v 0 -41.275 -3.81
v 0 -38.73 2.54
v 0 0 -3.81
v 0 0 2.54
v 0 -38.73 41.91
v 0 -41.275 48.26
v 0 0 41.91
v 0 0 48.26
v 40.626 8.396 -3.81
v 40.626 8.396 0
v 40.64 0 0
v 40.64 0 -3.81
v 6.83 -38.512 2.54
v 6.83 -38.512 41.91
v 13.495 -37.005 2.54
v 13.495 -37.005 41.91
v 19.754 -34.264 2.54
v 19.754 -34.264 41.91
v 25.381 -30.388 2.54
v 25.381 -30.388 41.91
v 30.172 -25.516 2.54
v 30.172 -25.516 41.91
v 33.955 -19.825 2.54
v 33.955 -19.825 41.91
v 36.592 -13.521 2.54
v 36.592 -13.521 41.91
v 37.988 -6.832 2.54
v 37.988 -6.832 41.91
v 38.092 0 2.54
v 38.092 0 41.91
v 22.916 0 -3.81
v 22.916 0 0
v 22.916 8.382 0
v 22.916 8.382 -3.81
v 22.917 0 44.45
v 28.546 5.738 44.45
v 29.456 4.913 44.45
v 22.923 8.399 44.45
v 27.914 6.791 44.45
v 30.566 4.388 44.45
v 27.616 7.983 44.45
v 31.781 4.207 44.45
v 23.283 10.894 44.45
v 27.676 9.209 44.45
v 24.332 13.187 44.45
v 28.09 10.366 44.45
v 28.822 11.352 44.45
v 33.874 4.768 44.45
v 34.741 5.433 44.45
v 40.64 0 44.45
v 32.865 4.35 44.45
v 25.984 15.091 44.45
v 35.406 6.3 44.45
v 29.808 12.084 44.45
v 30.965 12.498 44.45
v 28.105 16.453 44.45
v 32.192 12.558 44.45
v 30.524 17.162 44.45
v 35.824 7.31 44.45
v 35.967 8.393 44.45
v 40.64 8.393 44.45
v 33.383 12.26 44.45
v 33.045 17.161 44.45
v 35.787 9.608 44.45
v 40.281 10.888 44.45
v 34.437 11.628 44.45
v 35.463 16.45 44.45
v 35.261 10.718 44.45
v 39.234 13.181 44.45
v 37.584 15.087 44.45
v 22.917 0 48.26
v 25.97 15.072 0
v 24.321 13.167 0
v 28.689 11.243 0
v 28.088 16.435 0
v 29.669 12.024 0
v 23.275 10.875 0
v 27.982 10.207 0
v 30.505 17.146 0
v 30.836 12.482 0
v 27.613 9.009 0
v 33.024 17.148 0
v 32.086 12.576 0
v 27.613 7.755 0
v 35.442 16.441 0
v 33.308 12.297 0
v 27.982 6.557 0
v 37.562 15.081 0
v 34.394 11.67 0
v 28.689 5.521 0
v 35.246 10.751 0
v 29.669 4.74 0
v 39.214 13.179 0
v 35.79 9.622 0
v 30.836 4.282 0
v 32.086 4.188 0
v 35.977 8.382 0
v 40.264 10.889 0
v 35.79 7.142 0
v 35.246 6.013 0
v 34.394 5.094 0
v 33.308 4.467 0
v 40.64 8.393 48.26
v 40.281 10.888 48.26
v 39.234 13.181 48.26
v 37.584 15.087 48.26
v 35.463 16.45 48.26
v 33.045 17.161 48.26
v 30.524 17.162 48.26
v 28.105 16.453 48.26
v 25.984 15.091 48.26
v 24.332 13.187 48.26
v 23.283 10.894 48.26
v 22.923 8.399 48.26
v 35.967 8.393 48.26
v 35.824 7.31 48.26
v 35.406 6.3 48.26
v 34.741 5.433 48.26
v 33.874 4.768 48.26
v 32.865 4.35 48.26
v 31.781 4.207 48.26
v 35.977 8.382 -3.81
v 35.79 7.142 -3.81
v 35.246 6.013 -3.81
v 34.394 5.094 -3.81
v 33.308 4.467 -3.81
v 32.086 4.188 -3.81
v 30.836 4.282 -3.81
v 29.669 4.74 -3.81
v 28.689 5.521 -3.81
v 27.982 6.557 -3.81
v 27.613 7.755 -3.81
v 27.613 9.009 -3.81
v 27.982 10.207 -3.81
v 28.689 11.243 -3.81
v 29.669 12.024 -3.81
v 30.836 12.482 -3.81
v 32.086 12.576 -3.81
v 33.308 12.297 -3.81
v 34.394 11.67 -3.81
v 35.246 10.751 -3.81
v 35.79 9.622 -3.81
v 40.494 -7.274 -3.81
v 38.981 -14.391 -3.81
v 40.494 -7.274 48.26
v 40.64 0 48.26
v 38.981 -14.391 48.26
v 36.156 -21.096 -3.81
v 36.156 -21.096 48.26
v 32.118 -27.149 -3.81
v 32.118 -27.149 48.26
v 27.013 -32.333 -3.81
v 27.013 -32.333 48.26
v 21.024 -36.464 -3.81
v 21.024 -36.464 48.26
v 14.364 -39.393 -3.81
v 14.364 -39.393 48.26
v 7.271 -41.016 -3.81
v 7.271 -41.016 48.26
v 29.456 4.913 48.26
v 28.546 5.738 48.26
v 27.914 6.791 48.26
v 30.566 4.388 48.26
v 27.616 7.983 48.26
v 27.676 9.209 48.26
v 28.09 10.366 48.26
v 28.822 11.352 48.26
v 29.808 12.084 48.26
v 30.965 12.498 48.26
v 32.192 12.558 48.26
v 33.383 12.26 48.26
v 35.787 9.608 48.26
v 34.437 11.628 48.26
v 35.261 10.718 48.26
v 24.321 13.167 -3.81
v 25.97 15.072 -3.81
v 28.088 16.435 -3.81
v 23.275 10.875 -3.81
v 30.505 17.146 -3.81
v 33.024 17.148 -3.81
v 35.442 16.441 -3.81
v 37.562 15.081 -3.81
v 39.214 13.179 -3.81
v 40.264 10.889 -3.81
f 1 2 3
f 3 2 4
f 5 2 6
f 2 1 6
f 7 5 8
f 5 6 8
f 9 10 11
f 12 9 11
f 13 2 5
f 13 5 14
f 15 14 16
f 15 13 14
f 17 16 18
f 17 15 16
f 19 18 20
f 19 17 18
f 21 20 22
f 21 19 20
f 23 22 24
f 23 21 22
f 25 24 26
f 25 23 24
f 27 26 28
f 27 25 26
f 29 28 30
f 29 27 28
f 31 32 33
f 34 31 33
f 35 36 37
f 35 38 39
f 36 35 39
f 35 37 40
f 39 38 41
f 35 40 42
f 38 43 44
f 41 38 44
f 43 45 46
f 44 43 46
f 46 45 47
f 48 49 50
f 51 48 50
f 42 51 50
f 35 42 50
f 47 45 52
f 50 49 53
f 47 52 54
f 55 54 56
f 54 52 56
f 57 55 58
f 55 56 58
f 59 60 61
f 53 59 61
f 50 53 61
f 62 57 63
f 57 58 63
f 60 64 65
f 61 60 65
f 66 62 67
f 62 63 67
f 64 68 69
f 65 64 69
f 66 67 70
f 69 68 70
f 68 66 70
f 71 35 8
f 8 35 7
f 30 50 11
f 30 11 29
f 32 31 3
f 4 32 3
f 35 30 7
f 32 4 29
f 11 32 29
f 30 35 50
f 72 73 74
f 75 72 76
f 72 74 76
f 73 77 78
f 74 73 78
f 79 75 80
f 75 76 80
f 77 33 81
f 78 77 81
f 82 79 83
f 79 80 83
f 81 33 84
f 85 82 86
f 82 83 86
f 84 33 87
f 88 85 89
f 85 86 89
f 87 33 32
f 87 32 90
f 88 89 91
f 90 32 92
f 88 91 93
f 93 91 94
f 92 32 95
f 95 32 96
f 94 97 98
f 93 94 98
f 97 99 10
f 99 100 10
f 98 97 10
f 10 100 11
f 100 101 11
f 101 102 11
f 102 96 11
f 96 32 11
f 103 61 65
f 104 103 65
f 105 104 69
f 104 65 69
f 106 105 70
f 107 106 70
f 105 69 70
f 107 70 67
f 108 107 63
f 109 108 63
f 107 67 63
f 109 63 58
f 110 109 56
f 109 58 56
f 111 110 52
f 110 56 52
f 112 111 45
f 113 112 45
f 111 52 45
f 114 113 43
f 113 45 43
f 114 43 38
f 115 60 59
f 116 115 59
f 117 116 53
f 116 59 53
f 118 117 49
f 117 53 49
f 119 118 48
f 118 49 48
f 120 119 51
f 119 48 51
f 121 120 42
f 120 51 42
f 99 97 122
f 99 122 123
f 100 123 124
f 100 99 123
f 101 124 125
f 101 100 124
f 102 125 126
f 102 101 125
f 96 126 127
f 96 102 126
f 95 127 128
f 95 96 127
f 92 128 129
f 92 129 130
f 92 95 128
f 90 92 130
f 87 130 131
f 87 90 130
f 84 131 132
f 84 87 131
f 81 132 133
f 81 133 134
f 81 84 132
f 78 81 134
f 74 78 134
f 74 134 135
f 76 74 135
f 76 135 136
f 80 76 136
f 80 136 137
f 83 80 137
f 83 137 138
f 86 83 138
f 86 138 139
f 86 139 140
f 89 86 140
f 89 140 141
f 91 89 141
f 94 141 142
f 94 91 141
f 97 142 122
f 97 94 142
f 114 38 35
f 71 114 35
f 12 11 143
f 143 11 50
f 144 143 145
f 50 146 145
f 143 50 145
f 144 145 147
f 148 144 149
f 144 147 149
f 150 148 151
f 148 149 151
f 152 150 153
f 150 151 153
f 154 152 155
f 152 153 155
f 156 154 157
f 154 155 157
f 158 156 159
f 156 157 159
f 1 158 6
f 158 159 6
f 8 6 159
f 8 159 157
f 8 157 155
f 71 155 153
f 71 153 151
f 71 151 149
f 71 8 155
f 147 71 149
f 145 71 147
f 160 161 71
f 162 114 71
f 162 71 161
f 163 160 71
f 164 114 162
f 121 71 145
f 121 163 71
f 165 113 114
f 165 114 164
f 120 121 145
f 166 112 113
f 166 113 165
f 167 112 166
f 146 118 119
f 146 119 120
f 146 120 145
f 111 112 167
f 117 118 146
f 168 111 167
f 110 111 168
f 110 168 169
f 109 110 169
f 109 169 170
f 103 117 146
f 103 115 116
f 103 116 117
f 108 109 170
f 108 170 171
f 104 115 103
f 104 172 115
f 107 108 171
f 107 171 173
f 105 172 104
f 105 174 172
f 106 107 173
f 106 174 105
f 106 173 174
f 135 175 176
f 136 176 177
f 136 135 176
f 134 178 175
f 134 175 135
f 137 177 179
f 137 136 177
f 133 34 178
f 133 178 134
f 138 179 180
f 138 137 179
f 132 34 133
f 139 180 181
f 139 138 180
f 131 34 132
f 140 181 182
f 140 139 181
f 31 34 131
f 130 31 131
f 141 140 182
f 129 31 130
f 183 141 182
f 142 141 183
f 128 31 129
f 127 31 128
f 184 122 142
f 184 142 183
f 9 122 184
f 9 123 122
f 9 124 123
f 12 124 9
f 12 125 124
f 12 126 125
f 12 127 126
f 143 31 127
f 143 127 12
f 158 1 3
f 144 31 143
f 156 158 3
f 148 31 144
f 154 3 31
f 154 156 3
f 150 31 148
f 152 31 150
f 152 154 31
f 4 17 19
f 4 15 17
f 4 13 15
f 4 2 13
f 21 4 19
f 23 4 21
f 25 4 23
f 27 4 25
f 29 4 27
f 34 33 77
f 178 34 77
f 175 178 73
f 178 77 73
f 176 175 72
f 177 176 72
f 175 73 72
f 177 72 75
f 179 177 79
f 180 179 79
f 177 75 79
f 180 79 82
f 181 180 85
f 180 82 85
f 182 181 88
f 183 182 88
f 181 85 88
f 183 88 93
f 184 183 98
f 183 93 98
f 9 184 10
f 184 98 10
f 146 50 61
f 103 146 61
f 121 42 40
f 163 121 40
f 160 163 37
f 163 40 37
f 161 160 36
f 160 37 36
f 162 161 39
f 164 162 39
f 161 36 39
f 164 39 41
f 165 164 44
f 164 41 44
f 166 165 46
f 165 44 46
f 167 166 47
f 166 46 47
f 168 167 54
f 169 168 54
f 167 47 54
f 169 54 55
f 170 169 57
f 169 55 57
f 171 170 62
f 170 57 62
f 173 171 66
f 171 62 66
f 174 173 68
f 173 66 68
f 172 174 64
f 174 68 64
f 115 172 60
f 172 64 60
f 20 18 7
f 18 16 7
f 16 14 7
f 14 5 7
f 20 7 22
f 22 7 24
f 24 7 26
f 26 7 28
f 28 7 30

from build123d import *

# Parameters (mm, degrees)
F1_DEPTH = 44.45
F2_T     = -2.54
F4_DEPTH = 3.81
F5_R     = 4.205558
F6_DEPTH = 3.81


with BuildPart() as f1:
    # F0 (on Top) → F1 (new body)
    with BuildSketch(Plane.XY):
        with BuildLine():
            Line((40.64, 0), (0, 0))
            Line((0, 0), (0, -41.275))
            ThreePointArc((0, -41.275), (29.688681, -29.862048), (40.64, 0))
        make_face()
    extrude(amount=F1_DEPTH)

    # F2
    f2_openings = [f1.faces().sort_by_distance(p)[0] for p in [
        (0, -20.6375, 22.225),
        (20.32, 0, 22.225),
    ]]
    offset(amount=F2_T, openings=f2_openings)

    # F3 (on face) → F4 (join)
    with BuildSketch(Plane.XY.offset(44.45)):
        with BuildLine():
            ThreePointArc((0, -41.275), (29.688681, -29.862048), (40.64, 0))
            Line((40.64, 0), (31.781275, 0))
            Line((31.781275, 0), (22.916552, 0))
            Line((22.916552, 0), (0, 0))
            Line((0, 0), (0, -41.275))
        make_face()
        with BuildLine():
            Line((31.781275, 0), (40.64, 0))
            Line((40.64, 0), (40.64, 8.392821))
            ThreePointArc((40.64, 8.392821), (31.784439, 17.251546), (22.922552, 8.39915))
            Line((22.922552, 8.39915), (22.916552, 0))
            Line((22.916552, 0), (31.781275, 0))
        make_face()
        with BuildLine():
            ThreePointArc((35.966783, 8.392821), (34.740876, 5.43322), (31.781275, 4.207313))
            ThreePointArc((31.781275, 4.207313), (28.821674, 11.352422), (35.966783, 8.392821))
        make_face(mode=Mode.SUBTRACT)
    extrude(amount=F4_DEPTH)

    # F5 (on face) → F6 (join)
    with BuildSketch(Plane(origin=(0, 0, 0), x_dir=(1, 0, 0), z_dir=(0, 0, -1))):
        with BuildLine():
            Line((40.626373, -8.396372), (40.64, 0))
            Line((40.64, 0), (31.771399, 0))
            Line((31.771399, 0), (22.916414, 0))
            Line((22.916414, 0), (22.916414, -8.382))
            ThreePointArc((22.916414, -8.382), (31.764213, -17.236982), (40.626373, -8.396372))
        make_face()
        with Locations((31.771399, -8.382)):
            Circle(F5_R, mode=Mode.SUBTRACT)
        with BuildLine():
            Line((31.771399, 0), (40.64, 0))
            ThreePointArc((40.64, 0), (29.688681, 29.862048), (0, 41.275))
            Line((0, 41.275), (0, 0))
            Line((0, 0), (22.916414, 0))
            Line((22.916414, 0), (31.771399, 0))
        make_face()
    extrude(amount=F6_DEPTH)


solid = f1.part
